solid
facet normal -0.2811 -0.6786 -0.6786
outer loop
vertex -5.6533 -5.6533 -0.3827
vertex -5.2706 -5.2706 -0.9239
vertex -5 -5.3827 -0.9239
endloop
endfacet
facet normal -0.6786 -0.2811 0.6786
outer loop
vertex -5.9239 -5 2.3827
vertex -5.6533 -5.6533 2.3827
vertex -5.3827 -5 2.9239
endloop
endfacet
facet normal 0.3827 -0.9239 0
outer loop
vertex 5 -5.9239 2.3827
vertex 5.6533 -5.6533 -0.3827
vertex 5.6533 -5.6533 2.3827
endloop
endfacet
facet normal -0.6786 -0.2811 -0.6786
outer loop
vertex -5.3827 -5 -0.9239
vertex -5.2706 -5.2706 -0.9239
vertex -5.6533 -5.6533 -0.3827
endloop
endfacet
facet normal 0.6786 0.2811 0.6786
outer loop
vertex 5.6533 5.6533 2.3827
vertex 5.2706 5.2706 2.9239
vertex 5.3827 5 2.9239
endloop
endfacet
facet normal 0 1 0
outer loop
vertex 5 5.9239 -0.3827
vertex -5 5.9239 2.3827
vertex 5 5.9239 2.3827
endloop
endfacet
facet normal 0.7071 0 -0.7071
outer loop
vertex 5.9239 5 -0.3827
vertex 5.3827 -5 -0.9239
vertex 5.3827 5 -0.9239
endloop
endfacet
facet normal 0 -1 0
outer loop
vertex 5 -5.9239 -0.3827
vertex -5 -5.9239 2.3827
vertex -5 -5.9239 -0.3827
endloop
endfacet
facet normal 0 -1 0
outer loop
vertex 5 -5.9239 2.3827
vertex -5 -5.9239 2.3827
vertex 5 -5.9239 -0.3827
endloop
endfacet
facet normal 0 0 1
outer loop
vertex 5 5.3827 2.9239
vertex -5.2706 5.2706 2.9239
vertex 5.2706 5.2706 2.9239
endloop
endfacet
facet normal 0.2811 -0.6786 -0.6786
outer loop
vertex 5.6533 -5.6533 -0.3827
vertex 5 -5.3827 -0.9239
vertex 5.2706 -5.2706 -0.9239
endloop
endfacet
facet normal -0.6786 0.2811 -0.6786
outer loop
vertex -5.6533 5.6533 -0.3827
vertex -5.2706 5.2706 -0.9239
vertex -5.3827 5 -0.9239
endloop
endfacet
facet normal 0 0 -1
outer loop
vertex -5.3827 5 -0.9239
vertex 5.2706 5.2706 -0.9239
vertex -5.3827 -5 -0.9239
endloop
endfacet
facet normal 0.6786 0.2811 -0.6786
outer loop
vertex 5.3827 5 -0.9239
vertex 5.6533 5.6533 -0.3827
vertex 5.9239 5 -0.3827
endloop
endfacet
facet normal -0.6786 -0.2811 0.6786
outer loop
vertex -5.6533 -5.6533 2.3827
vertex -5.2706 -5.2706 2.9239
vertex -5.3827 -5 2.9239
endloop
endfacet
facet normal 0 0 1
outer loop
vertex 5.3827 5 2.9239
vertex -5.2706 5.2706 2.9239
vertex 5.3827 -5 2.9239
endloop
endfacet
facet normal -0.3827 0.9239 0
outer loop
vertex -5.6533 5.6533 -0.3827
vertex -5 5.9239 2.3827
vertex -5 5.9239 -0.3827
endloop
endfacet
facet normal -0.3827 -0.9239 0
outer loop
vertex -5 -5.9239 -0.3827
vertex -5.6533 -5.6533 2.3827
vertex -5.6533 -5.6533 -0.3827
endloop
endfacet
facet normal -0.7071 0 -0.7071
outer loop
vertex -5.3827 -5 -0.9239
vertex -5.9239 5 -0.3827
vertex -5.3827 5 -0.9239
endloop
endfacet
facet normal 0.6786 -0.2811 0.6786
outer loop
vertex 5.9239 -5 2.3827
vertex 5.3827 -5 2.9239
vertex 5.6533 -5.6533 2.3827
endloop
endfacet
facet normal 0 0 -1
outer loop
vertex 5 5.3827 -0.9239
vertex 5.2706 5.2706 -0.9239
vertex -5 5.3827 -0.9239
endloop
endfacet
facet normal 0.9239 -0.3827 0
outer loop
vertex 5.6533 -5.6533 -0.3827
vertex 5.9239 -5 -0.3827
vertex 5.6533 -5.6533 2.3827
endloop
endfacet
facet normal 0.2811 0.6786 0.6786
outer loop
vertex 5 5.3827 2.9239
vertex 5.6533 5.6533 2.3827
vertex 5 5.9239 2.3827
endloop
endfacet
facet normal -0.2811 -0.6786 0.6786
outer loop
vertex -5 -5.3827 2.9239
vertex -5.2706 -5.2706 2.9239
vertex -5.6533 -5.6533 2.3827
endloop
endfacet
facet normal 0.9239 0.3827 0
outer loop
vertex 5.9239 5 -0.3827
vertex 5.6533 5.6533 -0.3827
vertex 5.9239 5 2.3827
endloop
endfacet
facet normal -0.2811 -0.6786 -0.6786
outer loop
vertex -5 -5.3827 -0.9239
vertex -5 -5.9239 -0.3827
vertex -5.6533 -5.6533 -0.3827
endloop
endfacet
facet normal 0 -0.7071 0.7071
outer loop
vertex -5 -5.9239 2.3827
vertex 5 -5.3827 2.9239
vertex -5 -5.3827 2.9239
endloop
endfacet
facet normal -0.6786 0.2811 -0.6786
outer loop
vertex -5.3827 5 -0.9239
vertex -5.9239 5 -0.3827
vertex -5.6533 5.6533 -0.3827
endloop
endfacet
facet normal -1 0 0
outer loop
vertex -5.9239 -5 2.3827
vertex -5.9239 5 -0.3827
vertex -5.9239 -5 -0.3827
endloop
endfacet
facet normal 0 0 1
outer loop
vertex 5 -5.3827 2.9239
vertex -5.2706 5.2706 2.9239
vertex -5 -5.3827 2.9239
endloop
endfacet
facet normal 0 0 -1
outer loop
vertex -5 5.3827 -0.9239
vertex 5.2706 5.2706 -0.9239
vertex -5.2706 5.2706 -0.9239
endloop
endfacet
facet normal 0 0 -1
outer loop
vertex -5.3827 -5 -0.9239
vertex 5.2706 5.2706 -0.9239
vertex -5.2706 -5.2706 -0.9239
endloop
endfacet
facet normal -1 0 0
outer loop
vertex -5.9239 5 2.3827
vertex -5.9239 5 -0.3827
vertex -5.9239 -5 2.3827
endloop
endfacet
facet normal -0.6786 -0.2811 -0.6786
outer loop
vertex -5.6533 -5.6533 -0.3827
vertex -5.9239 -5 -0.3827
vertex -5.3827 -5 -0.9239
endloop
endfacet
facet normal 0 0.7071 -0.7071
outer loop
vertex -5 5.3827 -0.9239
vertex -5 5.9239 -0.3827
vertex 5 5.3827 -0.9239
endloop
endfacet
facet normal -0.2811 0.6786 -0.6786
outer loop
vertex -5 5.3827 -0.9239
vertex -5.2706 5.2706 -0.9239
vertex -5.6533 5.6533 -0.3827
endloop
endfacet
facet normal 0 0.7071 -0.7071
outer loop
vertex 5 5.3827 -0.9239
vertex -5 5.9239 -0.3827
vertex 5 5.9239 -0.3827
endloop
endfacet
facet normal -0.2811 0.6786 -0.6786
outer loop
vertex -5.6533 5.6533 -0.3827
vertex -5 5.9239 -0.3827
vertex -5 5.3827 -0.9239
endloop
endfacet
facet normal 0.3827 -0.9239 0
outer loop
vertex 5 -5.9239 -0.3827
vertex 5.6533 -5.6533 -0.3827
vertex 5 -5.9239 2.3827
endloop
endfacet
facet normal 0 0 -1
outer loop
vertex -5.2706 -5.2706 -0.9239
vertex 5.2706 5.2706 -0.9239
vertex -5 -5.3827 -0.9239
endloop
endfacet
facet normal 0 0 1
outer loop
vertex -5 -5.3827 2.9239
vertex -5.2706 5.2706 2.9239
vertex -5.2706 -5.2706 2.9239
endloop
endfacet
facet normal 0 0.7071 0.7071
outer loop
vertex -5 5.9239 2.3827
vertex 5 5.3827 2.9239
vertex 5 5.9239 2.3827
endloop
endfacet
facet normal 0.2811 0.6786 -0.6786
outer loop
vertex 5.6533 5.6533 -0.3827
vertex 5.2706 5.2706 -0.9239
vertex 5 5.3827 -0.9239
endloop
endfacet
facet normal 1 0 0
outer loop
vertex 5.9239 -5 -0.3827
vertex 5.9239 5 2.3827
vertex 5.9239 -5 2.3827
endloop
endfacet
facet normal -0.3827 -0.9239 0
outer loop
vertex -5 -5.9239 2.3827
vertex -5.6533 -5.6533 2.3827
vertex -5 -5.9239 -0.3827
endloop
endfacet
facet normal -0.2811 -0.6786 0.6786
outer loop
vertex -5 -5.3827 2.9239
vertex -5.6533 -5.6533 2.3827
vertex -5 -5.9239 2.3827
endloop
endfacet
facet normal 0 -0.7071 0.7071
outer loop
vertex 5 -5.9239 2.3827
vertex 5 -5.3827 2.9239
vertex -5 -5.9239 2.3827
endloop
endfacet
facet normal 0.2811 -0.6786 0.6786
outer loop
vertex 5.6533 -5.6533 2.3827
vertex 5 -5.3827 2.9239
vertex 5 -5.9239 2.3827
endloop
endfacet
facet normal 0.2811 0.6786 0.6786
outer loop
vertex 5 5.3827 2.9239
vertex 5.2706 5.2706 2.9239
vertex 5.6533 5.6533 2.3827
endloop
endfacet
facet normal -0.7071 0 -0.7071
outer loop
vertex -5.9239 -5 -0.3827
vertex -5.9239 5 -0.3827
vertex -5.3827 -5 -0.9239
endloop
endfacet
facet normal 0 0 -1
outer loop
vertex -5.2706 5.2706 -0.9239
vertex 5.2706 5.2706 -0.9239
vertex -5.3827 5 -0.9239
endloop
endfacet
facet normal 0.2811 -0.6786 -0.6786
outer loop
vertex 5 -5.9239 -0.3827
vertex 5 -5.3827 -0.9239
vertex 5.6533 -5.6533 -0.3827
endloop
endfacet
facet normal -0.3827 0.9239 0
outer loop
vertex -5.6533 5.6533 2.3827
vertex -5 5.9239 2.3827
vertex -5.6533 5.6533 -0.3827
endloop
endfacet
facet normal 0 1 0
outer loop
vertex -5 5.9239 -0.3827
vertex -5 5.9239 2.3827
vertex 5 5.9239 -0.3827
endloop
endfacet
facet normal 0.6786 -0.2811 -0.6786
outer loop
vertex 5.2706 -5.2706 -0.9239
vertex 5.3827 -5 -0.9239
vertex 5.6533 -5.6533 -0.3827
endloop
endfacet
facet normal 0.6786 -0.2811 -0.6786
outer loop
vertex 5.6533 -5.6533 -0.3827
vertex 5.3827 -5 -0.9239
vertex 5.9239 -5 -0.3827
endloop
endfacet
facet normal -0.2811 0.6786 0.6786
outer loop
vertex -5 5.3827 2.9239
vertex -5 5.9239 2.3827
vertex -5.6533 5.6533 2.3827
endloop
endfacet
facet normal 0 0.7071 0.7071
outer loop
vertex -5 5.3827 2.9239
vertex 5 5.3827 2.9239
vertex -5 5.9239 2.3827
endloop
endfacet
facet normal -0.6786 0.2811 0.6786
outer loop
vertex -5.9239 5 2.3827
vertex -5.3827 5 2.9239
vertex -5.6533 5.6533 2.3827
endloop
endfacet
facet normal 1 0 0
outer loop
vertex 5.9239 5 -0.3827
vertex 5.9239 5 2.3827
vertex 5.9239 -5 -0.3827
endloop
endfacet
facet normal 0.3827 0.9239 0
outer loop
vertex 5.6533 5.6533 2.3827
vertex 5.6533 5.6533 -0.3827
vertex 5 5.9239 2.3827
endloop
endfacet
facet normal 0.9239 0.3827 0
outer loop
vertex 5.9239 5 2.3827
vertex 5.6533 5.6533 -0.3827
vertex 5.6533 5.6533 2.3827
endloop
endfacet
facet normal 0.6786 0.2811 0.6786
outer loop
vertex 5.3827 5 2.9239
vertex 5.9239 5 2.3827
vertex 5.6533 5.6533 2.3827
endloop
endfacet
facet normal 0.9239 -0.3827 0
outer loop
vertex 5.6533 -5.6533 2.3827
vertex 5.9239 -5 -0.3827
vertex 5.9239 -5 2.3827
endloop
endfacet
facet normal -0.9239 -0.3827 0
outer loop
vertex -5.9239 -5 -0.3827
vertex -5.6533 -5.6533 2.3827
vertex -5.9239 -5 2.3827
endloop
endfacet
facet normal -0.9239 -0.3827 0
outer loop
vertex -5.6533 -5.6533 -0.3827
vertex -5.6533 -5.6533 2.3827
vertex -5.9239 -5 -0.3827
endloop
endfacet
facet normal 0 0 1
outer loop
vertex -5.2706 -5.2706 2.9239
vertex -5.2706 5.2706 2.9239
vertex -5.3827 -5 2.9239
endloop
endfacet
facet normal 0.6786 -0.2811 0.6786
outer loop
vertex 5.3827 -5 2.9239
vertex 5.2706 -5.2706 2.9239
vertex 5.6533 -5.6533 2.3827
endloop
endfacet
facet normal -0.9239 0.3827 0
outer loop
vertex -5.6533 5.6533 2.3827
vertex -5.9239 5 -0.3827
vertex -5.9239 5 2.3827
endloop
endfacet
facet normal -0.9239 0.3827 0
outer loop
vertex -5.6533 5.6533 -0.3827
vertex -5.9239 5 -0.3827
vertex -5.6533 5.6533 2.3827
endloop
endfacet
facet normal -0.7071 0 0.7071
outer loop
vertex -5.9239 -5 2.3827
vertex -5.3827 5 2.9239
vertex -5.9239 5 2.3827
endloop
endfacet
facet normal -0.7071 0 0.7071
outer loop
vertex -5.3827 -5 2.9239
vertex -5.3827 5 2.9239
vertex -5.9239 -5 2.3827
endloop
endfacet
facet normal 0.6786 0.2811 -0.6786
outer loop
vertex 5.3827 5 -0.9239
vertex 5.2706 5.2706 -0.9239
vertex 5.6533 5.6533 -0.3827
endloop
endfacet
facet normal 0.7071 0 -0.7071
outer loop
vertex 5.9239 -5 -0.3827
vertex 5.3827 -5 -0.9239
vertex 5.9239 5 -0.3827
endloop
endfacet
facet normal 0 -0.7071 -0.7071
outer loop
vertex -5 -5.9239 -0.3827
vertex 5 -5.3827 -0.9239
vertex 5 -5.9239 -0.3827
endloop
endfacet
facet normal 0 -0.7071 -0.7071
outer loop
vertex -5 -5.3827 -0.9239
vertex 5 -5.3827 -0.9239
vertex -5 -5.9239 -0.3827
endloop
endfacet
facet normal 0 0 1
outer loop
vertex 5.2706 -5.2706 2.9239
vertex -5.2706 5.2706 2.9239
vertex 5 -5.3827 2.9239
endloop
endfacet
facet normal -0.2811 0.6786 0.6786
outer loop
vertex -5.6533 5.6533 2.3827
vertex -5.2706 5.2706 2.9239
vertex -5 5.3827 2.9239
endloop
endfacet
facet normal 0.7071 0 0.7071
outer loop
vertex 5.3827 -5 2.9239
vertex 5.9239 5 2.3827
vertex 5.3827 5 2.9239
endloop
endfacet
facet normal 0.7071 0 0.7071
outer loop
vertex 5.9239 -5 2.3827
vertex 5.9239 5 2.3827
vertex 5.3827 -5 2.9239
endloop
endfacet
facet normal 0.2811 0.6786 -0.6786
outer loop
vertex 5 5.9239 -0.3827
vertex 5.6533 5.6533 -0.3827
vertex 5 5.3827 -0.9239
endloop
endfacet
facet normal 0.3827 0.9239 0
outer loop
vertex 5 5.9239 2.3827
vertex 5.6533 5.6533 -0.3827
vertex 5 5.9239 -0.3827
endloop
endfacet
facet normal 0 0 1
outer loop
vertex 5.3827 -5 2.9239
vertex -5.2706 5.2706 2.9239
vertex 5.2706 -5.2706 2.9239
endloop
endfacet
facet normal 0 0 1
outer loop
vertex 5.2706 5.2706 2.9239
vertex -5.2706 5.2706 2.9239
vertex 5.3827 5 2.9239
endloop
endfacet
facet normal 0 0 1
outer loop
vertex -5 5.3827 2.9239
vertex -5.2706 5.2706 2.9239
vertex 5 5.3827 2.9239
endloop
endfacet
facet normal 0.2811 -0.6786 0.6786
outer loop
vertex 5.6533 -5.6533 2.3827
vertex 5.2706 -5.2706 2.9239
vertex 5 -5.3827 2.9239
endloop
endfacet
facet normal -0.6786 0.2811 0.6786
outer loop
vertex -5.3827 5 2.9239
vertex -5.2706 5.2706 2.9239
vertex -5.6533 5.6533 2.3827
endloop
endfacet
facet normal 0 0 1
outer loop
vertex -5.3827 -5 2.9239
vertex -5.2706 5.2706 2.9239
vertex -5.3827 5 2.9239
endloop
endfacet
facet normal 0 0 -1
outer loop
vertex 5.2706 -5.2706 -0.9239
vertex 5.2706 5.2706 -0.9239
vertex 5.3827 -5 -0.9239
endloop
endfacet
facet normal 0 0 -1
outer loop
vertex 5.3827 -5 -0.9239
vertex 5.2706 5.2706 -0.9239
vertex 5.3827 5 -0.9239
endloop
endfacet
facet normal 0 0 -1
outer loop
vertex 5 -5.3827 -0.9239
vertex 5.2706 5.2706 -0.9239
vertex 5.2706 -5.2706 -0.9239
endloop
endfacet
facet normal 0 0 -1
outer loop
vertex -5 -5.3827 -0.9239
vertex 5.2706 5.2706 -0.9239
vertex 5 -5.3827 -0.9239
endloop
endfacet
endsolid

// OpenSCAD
// Generated by scadwright. Do not hand-edit —
// edit the Python source and regenerate.

$fn = 8;

minkowski() {
    translate([-5, -5, 0]) {
        cube([10, 10, 2], center=false);
    }
    sphere(r=1);
}
